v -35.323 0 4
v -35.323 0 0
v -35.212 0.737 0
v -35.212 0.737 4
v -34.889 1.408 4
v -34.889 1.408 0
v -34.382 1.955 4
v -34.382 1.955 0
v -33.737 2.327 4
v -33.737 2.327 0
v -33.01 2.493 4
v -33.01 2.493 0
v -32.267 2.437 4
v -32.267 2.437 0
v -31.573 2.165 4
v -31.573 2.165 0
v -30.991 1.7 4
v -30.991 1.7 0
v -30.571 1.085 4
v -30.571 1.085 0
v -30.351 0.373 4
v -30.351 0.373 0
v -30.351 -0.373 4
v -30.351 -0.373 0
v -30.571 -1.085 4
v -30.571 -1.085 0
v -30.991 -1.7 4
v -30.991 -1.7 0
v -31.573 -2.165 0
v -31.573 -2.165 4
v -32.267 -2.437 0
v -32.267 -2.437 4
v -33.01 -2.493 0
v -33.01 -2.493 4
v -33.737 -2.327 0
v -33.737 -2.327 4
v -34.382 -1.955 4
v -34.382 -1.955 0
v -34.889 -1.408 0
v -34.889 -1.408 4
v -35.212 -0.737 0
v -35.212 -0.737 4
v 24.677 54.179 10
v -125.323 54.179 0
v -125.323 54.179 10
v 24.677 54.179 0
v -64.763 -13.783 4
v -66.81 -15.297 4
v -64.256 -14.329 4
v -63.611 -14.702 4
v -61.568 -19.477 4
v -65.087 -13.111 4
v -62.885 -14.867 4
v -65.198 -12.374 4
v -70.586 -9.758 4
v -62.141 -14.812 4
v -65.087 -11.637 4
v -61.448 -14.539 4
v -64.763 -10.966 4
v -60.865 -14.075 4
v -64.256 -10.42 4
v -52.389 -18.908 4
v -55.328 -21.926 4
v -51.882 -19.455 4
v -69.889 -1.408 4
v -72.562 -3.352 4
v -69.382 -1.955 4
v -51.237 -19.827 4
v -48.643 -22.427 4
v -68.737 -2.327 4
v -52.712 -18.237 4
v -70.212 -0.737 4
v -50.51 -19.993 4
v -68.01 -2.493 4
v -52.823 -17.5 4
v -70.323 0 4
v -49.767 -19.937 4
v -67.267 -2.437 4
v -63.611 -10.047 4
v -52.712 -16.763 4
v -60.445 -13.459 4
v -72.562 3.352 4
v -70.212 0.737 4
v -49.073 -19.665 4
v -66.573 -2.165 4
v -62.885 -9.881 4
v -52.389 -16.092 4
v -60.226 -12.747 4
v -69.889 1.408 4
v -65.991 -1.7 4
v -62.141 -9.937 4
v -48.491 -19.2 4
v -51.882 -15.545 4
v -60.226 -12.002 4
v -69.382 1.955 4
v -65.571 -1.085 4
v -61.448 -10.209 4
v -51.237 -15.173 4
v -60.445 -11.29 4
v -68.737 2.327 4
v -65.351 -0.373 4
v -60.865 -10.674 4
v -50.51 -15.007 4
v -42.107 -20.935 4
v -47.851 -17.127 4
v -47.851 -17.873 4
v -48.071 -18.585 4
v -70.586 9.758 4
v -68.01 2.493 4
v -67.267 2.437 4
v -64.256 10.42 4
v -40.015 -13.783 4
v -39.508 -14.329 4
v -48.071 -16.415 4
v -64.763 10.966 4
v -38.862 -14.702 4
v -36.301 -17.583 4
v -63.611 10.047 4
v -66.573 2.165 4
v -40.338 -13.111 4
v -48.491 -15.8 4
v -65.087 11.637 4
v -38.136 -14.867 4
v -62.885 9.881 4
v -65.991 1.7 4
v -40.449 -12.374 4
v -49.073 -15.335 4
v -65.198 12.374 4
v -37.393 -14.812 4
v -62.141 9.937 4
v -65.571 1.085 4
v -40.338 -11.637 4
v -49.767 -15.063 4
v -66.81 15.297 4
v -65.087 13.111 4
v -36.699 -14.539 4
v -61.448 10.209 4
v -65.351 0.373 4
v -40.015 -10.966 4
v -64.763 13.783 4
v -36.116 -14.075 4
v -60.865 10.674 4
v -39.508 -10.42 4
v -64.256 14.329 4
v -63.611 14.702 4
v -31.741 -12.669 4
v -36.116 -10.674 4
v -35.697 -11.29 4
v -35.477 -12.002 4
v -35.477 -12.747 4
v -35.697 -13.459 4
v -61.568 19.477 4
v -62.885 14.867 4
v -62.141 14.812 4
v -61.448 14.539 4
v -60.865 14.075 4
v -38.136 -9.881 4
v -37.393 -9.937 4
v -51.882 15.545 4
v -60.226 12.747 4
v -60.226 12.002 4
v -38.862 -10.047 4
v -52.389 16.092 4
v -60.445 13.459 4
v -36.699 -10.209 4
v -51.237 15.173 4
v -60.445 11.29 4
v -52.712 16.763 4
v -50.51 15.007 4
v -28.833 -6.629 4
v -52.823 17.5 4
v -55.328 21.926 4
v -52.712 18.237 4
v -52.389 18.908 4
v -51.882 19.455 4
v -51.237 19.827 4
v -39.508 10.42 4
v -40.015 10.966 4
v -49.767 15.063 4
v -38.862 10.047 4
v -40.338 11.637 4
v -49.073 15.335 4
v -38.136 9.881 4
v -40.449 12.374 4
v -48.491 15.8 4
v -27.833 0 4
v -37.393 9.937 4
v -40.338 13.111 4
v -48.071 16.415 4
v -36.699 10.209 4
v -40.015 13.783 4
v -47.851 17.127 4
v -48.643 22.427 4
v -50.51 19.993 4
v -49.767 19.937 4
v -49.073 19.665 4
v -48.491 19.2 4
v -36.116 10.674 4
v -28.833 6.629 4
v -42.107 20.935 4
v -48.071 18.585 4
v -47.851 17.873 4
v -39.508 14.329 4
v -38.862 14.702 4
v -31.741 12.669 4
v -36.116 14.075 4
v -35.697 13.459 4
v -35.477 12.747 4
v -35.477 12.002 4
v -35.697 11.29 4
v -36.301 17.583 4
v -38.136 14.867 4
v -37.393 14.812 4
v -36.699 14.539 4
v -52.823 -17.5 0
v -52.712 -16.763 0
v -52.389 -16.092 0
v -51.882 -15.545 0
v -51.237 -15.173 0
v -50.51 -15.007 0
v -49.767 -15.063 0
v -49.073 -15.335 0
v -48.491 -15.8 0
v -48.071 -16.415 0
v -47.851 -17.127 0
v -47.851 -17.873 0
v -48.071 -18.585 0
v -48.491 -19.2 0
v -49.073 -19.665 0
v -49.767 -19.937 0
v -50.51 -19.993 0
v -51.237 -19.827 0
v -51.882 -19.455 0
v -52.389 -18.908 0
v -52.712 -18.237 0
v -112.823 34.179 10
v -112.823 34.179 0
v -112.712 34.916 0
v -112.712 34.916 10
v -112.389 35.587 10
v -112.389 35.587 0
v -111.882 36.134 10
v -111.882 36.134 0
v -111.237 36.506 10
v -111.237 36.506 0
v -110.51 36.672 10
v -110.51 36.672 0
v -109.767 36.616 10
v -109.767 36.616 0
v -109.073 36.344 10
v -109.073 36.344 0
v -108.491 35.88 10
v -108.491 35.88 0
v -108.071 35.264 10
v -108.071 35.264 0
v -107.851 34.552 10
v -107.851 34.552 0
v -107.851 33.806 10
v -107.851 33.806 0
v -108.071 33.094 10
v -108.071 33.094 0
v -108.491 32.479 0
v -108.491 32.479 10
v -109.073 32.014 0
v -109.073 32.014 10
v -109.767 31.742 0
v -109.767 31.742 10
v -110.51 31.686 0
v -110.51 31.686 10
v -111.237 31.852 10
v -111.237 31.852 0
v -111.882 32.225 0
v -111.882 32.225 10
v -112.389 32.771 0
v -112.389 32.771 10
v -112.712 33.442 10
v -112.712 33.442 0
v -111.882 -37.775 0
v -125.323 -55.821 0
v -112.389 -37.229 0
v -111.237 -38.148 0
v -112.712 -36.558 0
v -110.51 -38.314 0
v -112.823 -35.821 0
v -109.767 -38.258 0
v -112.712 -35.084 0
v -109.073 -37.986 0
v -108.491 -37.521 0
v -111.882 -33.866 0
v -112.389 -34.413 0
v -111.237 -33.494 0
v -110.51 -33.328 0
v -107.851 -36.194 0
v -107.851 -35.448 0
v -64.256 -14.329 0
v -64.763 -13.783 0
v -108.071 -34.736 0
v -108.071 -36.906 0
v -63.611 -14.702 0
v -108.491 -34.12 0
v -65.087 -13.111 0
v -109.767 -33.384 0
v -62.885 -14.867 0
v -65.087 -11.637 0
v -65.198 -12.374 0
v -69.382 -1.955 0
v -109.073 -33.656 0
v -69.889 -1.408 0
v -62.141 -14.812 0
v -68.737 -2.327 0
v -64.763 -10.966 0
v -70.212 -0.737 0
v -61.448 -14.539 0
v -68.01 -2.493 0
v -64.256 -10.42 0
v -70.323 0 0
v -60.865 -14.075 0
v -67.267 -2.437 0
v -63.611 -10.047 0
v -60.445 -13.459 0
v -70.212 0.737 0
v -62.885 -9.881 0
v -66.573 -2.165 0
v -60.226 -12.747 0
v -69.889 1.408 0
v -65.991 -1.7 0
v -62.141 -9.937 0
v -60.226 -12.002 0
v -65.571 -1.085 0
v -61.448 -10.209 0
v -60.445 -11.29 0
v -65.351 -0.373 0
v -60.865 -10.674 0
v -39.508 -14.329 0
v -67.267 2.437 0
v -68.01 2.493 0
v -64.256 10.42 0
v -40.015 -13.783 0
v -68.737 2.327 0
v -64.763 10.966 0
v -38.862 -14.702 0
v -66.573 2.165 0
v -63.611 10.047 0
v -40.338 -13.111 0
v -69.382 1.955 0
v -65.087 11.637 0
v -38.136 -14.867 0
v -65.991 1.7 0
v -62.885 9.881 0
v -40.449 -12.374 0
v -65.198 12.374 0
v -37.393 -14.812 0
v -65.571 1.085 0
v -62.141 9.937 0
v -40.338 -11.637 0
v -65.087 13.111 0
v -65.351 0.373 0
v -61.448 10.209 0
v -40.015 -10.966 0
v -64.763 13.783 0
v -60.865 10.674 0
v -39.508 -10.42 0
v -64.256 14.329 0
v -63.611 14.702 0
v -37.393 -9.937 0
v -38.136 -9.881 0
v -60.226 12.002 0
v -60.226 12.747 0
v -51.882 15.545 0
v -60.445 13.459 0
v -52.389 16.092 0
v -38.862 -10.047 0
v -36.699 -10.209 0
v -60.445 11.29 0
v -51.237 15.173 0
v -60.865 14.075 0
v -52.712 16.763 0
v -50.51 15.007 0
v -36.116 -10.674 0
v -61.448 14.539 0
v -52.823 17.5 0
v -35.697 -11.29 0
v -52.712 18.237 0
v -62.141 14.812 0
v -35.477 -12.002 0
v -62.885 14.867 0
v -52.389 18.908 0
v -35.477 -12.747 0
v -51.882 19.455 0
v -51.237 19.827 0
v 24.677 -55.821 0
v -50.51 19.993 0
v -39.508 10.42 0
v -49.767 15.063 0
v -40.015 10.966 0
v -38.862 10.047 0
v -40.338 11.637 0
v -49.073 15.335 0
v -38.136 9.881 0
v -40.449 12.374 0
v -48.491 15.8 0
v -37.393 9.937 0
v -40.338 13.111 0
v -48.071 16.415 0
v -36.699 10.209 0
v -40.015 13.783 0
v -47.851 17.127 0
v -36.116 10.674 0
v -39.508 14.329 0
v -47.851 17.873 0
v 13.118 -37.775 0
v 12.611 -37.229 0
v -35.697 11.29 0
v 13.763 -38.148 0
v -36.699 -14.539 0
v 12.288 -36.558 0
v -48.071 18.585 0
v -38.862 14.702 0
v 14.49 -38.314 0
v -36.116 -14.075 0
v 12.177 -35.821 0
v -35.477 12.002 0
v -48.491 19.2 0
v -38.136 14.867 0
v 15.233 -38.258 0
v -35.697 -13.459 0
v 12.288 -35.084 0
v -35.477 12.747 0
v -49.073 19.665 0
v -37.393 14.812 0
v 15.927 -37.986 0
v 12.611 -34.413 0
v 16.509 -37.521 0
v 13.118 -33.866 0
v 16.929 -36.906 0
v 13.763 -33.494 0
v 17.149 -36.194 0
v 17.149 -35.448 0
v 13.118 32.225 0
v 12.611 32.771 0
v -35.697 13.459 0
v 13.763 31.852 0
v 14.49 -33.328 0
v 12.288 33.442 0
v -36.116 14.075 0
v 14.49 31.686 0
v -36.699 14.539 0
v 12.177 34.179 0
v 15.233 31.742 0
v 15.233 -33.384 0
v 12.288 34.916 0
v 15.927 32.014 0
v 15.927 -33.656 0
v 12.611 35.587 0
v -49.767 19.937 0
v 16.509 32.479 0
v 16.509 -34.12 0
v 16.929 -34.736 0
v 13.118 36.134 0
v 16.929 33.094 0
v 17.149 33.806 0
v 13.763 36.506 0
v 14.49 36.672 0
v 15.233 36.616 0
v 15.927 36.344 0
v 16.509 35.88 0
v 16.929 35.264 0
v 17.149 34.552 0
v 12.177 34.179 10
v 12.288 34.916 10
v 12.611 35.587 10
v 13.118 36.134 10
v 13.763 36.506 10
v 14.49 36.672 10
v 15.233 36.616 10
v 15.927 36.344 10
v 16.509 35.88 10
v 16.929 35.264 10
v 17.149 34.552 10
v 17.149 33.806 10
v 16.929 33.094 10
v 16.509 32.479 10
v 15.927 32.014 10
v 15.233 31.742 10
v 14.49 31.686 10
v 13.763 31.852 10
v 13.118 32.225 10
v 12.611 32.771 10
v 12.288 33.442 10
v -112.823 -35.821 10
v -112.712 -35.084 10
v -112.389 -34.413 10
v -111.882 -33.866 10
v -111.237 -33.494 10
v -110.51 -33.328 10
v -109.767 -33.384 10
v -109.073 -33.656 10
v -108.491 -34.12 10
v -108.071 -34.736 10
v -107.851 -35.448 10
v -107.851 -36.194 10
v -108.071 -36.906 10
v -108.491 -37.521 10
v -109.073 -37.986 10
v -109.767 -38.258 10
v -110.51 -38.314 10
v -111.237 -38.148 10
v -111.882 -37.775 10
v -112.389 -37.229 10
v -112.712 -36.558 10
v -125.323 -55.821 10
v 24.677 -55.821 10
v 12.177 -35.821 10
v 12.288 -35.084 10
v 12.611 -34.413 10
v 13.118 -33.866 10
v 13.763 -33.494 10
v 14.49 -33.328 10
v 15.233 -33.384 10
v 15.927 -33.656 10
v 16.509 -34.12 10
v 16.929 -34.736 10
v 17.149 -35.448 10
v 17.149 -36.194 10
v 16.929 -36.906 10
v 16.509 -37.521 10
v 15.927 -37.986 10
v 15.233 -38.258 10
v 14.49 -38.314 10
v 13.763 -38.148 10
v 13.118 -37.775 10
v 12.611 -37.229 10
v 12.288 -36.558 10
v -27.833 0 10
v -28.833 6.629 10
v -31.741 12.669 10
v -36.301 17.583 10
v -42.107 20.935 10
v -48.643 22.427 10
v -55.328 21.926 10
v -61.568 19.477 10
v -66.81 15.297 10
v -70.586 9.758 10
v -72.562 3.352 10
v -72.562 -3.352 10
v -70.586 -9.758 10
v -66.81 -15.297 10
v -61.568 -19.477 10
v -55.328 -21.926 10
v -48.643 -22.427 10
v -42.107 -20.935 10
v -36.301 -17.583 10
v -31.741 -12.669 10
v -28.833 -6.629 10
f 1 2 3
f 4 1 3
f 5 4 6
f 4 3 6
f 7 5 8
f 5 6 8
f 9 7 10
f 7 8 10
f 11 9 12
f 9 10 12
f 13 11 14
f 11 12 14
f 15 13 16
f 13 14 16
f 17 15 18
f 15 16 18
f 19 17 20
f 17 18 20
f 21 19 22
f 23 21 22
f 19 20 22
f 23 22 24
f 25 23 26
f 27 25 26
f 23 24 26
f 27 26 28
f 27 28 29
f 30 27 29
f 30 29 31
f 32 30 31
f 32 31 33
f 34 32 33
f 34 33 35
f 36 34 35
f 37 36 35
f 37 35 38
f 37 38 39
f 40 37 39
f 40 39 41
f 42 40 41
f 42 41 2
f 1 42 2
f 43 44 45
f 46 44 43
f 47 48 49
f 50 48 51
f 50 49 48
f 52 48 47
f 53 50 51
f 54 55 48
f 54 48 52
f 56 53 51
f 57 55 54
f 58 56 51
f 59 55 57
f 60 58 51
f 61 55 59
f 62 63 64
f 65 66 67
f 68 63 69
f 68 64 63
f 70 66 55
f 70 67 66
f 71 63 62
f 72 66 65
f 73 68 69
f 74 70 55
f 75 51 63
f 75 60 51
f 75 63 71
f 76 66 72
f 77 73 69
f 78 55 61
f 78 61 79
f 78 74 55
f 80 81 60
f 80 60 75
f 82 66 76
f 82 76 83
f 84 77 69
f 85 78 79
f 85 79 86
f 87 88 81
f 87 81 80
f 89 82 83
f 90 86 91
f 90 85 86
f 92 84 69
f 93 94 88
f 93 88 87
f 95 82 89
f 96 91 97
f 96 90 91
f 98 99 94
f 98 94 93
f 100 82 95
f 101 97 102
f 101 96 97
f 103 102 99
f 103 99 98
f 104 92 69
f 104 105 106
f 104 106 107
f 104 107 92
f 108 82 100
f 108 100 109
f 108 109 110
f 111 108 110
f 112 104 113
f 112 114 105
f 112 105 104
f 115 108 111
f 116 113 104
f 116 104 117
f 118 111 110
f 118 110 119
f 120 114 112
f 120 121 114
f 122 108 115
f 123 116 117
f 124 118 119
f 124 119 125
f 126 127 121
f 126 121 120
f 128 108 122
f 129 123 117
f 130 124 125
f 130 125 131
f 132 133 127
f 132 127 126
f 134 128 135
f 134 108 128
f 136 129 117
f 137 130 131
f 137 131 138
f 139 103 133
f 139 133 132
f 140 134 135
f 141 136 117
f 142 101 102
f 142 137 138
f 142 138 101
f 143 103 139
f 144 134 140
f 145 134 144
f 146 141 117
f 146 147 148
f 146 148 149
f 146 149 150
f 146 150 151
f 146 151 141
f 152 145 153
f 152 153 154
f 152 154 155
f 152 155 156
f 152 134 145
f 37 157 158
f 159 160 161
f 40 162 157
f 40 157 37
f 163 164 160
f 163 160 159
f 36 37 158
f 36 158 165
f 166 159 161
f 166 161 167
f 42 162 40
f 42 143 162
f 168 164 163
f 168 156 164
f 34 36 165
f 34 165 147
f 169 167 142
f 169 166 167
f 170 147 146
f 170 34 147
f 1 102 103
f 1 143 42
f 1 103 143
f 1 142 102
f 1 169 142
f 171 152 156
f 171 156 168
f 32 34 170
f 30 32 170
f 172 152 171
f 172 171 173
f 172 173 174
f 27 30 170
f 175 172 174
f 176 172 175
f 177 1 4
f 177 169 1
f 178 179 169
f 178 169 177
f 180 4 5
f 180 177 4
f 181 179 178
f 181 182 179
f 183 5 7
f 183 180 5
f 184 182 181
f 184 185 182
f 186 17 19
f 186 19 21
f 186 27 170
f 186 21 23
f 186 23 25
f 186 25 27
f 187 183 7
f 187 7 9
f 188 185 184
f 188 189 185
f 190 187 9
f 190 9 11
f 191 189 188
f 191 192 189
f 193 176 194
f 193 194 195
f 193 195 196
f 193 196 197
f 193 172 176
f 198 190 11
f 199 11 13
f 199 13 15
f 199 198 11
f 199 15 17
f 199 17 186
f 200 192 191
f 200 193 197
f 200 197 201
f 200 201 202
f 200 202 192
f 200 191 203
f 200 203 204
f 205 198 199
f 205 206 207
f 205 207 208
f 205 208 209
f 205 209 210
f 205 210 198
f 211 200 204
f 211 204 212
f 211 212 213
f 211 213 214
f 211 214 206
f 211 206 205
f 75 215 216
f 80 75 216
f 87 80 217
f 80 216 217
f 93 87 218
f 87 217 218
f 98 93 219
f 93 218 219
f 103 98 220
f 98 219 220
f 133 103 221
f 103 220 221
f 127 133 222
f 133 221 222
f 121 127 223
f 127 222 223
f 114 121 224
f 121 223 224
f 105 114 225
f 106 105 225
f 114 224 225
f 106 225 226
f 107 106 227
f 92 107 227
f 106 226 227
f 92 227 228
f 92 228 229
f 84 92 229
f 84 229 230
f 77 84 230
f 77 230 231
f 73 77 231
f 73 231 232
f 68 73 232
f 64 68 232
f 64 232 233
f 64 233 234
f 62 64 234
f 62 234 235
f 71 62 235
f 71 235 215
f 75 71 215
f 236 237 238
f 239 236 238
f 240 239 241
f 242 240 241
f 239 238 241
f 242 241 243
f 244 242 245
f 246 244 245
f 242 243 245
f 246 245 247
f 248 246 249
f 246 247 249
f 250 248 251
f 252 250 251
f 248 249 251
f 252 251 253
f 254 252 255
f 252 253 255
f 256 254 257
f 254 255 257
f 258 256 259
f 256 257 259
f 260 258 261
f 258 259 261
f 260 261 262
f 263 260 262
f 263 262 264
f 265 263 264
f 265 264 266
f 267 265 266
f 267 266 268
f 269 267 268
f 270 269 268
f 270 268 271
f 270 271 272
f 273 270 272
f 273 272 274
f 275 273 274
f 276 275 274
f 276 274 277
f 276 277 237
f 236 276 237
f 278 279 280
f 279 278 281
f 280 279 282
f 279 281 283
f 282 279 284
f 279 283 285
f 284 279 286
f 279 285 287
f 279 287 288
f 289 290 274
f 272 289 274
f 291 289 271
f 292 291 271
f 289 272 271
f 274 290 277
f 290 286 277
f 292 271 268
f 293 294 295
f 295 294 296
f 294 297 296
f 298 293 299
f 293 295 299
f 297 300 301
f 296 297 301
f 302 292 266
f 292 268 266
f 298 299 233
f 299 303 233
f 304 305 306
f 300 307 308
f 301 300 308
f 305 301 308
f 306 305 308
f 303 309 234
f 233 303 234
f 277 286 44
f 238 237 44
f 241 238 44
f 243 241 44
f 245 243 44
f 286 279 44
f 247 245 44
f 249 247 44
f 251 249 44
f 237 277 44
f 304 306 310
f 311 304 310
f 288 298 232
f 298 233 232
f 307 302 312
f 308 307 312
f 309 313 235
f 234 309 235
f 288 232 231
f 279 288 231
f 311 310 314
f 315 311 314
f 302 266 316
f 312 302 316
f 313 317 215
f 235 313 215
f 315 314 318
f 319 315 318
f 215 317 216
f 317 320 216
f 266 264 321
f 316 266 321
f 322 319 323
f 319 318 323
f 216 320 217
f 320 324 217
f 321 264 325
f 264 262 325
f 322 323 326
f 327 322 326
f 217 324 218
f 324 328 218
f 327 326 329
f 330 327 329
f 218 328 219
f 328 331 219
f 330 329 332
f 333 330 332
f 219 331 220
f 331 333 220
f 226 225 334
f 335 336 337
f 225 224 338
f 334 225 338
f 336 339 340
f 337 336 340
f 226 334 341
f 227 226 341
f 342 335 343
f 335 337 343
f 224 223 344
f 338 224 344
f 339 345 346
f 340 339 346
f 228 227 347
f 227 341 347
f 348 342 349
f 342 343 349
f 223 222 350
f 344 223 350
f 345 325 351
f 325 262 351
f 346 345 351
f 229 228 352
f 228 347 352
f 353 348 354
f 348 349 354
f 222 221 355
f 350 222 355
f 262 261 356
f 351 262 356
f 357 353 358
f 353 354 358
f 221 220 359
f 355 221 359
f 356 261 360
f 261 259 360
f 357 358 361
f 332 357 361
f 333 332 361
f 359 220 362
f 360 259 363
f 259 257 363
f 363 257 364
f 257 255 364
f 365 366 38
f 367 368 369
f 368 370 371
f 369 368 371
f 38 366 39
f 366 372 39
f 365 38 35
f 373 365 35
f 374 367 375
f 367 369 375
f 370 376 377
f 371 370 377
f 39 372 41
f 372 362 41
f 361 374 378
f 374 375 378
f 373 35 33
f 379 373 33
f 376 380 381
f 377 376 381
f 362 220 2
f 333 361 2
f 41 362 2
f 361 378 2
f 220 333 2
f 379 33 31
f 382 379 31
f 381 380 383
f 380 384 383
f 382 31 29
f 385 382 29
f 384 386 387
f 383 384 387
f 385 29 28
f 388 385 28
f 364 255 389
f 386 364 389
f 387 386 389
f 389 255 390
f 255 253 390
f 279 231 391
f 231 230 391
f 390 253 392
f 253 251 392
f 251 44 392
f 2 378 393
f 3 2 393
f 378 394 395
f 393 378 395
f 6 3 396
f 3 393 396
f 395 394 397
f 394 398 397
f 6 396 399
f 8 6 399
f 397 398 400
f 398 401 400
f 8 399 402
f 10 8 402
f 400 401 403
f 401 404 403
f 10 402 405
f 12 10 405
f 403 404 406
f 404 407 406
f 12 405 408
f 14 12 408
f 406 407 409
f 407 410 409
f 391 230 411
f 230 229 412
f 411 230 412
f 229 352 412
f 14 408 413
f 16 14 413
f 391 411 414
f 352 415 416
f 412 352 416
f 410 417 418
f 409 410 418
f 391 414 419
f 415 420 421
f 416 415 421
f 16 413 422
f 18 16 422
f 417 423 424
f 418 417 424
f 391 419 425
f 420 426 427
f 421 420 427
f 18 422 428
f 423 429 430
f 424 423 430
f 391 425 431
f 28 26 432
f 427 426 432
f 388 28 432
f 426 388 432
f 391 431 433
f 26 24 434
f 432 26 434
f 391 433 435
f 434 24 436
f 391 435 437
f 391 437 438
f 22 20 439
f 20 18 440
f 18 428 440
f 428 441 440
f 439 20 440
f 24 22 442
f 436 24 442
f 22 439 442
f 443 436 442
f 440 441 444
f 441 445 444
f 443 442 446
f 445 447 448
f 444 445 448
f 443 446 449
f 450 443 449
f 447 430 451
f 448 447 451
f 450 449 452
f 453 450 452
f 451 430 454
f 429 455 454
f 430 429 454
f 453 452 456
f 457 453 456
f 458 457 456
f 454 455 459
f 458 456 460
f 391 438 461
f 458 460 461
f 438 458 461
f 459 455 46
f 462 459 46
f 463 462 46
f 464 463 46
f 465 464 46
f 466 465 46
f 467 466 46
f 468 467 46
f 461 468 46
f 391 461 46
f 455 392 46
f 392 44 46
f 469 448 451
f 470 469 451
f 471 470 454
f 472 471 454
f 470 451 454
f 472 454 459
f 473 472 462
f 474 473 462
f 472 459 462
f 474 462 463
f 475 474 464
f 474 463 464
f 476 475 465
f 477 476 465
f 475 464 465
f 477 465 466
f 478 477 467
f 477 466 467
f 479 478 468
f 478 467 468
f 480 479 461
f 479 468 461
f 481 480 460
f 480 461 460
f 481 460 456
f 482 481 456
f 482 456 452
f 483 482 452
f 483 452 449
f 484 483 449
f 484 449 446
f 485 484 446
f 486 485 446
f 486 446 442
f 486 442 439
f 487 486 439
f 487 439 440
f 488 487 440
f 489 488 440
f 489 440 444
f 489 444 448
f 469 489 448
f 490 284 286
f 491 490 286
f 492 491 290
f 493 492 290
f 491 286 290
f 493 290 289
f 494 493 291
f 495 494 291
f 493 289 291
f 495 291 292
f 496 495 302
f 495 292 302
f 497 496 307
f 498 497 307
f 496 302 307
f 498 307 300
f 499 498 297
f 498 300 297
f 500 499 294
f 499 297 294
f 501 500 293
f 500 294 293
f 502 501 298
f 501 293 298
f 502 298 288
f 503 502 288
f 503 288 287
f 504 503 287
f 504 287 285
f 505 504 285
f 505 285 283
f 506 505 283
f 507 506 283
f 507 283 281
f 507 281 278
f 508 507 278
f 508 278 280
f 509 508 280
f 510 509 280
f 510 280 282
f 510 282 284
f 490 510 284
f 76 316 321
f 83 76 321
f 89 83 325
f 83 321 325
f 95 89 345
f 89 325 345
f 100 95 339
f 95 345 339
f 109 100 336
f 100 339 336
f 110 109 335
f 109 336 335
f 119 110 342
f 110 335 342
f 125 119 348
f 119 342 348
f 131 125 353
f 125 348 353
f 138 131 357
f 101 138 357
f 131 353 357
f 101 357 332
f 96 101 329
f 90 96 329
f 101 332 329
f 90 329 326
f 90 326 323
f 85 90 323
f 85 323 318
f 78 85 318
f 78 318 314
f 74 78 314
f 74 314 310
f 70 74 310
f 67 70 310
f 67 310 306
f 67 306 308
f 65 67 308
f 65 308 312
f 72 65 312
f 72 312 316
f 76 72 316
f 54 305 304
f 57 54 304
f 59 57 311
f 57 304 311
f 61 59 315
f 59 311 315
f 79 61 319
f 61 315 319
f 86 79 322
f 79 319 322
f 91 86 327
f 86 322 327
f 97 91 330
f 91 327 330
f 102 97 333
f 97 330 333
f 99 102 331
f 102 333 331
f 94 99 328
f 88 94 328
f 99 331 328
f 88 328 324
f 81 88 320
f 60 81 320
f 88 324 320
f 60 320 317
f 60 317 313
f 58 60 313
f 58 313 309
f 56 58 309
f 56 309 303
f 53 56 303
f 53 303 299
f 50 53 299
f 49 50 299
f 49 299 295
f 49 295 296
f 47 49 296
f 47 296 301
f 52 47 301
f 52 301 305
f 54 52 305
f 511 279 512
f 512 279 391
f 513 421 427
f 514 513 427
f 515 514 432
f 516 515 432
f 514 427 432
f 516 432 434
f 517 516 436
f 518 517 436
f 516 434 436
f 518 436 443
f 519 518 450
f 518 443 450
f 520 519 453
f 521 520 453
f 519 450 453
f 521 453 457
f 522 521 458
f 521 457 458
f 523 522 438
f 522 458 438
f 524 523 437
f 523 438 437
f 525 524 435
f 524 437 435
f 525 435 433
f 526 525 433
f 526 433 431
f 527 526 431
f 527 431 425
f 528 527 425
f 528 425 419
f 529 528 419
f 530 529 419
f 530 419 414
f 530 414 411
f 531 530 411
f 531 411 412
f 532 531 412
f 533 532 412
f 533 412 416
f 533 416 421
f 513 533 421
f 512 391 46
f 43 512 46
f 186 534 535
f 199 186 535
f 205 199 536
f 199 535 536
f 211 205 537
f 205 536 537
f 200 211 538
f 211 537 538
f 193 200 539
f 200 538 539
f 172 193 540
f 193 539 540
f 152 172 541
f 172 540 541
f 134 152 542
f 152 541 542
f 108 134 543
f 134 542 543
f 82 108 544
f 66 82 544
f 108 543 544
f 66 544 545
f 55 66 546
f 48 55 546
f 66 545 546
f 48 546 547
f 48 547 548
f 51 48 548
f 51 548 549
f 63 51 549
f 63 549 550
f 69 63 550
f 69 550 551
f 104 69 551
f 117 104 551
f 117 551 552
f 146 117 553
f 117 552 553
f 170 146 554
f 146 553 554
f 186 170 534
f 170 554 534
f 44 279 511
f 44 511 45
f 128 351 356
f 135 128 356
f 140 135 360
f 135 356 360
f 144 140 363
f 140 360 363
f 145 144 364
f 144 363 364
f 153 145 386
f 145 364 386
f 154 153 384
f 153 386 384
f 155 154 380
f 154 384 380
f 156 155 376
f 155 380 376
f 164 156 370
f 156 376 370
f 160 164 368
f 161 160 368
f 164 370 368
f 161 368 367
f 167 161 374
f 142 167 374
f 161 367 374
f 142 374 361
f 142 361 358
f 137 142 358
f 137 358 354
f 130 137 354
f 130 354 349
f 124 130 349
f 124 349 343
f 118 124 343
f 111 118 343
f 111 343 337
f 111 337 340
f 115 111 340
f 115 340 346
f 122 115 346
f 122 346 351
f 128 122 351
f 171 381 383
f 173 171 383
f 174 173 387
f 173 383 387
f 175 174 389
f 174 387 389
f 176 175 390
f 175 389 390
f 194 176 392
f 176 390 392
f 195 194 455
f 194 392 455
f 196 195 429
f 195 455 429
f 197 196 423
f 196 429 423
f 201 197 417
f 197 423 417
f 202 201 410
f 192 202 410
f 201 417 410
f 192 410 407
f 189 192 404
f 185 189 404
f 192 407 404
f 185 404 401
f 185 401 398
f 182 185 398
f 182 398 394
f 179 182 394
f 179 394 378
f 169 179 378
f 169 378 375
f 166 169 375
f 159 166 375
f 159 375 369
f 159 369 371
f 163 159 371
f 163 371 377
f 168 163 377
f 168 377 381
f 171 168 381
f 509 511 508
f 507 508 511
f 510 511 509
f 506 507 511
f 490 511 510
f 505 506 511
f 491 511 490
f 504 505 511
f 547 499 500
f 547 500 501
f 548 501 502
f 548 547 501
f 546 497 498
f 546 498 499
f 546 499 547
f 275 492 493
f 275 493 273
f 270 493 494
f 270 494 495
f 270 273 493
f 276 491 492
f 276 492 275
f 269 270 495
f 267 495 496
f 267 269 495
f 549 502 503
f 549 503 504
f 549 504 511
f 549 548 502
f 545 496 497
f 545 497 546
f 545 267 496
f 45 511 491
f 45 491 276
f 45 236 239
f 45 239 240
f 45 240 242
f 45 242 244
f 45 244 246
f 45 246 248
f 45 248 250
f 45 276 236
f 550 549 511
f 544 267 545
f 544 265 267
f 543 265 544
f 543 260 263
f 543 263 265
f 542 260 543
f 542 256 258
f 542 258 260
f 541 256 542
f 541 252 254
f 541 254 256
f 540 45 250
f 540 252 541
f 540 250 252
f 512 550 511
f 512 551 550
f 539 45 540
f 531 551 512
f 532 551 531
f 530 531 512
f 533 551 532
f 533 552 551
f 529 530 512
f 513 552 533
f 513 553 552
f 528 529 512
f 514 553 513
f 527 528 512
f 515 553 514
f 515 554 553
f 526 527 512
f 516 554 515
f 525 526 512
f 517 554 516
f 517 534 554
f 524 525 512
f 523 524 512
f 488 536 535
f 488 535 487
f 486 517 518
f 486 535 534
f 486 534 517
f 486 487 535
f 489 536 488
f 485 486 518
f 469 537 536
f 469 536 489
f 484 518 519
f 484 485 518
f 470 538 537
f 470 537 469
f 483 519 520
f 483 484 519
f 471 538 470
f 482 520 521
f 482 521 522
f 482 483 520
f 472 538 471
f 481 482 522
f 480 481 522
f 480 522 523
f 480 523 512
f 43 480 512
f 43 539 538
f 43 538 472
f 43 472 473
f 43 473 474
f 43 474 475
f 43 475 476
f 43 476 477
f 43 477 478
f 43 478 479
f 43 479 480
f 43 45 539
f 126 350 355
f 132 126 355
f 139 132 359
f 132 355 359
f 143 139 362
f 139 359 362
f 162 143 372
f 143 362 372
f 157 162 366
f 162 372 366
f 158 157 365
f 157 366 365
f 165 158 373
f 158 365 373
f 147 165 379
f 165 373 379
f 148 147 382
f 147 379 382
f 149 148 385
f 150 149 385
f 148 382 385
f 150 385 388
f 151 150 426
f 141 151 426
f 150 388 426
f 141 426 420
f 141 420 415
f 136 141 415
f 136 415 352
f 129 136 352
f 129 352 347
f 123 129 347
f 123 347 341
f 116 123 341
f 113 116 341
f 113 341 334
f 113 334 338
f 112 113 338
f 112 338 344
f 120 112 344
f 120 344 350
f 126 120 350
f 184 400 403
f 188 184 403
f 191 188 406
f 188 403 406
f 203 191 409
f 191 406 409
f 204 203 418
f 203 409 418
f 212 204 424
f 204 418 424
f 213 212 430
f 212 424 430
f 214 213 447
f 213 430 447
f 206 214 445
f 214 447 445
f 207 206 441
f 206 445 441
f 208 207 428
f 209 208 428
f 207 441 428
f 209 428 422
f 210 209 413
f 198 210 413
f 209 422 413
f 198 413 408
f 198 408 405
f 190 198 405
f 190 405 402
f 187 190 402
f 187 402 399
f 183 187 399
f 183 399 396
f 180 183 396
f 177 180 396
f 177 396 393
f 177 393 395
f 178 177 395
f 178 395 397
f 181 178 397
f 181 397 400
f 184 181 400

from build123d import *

# Parameters (mm, degrees)
SKETCH1_W             = 150
SKETCH1_H             = 110
BOSS_EXTRUDE2_DEPTH   = 10
SKETCH2_R             = 22.49
CUT_EXTRUDE1_DEPTH    = 6
F_5_0MM_DOWEL_HOLE1_D = 5
F_5_0MM_DOWEL_HOLE2_D = 5


with BuildPart() as part:
    # Sketch1 → Boss-Extrude2 (new body)
    with BuildSketch(Plane.XY):
        with Locations((-50.323383085, -0.820895522)):
            Rectangle(SKETCH1_W, SKETCH1_H)
    extrude(amount=BOSS_EXTRUDE2_DEPTH)

    # Sketch2 → Cut-Extrude1 (cut)
    with BuildSketch(Plane.XY.offset(10)):
        with Locations((-50.323383085, 0)):
            Circle(SKETCH2_R)
    extrude(amount=-CUT_EXTRUDE1_DEPTH, mode=Mode.SUBTRACT)

    # Ø5.0mm Dowel Hole1 (through all)
    with Locations(Plane(origin=(-50.323383085, 17.5, 4), x_dir=(1, 0, 0), z_dir=(0, 0, 1))):
        with Locations((0, 0), (-12.37436867, -5.125631329), (-17.5, -17.5), (-12.37436867, -29.874368671), (0, -35), (12.374368671, -29.874368671), (17.5, -17.5), (12.374368671, -5.125631329)):
            Hole(F_5_0MM_DOWEL_HOLE1_D / 2)

    # Ø5.0mm Dowel Hole2 (through all)
    with Locations(Plane(origin=(-110.323383085, 34.179104478, 10), x_dir=(1, 0, 0), z_dir=(0, 0, 1))):
        with Locations((0, 0), (125, 0), (125, -70), (0, -70)):
            Hole(F_5_0MM_DOWEL_HOLE2_D / 2)


solid = part.part
